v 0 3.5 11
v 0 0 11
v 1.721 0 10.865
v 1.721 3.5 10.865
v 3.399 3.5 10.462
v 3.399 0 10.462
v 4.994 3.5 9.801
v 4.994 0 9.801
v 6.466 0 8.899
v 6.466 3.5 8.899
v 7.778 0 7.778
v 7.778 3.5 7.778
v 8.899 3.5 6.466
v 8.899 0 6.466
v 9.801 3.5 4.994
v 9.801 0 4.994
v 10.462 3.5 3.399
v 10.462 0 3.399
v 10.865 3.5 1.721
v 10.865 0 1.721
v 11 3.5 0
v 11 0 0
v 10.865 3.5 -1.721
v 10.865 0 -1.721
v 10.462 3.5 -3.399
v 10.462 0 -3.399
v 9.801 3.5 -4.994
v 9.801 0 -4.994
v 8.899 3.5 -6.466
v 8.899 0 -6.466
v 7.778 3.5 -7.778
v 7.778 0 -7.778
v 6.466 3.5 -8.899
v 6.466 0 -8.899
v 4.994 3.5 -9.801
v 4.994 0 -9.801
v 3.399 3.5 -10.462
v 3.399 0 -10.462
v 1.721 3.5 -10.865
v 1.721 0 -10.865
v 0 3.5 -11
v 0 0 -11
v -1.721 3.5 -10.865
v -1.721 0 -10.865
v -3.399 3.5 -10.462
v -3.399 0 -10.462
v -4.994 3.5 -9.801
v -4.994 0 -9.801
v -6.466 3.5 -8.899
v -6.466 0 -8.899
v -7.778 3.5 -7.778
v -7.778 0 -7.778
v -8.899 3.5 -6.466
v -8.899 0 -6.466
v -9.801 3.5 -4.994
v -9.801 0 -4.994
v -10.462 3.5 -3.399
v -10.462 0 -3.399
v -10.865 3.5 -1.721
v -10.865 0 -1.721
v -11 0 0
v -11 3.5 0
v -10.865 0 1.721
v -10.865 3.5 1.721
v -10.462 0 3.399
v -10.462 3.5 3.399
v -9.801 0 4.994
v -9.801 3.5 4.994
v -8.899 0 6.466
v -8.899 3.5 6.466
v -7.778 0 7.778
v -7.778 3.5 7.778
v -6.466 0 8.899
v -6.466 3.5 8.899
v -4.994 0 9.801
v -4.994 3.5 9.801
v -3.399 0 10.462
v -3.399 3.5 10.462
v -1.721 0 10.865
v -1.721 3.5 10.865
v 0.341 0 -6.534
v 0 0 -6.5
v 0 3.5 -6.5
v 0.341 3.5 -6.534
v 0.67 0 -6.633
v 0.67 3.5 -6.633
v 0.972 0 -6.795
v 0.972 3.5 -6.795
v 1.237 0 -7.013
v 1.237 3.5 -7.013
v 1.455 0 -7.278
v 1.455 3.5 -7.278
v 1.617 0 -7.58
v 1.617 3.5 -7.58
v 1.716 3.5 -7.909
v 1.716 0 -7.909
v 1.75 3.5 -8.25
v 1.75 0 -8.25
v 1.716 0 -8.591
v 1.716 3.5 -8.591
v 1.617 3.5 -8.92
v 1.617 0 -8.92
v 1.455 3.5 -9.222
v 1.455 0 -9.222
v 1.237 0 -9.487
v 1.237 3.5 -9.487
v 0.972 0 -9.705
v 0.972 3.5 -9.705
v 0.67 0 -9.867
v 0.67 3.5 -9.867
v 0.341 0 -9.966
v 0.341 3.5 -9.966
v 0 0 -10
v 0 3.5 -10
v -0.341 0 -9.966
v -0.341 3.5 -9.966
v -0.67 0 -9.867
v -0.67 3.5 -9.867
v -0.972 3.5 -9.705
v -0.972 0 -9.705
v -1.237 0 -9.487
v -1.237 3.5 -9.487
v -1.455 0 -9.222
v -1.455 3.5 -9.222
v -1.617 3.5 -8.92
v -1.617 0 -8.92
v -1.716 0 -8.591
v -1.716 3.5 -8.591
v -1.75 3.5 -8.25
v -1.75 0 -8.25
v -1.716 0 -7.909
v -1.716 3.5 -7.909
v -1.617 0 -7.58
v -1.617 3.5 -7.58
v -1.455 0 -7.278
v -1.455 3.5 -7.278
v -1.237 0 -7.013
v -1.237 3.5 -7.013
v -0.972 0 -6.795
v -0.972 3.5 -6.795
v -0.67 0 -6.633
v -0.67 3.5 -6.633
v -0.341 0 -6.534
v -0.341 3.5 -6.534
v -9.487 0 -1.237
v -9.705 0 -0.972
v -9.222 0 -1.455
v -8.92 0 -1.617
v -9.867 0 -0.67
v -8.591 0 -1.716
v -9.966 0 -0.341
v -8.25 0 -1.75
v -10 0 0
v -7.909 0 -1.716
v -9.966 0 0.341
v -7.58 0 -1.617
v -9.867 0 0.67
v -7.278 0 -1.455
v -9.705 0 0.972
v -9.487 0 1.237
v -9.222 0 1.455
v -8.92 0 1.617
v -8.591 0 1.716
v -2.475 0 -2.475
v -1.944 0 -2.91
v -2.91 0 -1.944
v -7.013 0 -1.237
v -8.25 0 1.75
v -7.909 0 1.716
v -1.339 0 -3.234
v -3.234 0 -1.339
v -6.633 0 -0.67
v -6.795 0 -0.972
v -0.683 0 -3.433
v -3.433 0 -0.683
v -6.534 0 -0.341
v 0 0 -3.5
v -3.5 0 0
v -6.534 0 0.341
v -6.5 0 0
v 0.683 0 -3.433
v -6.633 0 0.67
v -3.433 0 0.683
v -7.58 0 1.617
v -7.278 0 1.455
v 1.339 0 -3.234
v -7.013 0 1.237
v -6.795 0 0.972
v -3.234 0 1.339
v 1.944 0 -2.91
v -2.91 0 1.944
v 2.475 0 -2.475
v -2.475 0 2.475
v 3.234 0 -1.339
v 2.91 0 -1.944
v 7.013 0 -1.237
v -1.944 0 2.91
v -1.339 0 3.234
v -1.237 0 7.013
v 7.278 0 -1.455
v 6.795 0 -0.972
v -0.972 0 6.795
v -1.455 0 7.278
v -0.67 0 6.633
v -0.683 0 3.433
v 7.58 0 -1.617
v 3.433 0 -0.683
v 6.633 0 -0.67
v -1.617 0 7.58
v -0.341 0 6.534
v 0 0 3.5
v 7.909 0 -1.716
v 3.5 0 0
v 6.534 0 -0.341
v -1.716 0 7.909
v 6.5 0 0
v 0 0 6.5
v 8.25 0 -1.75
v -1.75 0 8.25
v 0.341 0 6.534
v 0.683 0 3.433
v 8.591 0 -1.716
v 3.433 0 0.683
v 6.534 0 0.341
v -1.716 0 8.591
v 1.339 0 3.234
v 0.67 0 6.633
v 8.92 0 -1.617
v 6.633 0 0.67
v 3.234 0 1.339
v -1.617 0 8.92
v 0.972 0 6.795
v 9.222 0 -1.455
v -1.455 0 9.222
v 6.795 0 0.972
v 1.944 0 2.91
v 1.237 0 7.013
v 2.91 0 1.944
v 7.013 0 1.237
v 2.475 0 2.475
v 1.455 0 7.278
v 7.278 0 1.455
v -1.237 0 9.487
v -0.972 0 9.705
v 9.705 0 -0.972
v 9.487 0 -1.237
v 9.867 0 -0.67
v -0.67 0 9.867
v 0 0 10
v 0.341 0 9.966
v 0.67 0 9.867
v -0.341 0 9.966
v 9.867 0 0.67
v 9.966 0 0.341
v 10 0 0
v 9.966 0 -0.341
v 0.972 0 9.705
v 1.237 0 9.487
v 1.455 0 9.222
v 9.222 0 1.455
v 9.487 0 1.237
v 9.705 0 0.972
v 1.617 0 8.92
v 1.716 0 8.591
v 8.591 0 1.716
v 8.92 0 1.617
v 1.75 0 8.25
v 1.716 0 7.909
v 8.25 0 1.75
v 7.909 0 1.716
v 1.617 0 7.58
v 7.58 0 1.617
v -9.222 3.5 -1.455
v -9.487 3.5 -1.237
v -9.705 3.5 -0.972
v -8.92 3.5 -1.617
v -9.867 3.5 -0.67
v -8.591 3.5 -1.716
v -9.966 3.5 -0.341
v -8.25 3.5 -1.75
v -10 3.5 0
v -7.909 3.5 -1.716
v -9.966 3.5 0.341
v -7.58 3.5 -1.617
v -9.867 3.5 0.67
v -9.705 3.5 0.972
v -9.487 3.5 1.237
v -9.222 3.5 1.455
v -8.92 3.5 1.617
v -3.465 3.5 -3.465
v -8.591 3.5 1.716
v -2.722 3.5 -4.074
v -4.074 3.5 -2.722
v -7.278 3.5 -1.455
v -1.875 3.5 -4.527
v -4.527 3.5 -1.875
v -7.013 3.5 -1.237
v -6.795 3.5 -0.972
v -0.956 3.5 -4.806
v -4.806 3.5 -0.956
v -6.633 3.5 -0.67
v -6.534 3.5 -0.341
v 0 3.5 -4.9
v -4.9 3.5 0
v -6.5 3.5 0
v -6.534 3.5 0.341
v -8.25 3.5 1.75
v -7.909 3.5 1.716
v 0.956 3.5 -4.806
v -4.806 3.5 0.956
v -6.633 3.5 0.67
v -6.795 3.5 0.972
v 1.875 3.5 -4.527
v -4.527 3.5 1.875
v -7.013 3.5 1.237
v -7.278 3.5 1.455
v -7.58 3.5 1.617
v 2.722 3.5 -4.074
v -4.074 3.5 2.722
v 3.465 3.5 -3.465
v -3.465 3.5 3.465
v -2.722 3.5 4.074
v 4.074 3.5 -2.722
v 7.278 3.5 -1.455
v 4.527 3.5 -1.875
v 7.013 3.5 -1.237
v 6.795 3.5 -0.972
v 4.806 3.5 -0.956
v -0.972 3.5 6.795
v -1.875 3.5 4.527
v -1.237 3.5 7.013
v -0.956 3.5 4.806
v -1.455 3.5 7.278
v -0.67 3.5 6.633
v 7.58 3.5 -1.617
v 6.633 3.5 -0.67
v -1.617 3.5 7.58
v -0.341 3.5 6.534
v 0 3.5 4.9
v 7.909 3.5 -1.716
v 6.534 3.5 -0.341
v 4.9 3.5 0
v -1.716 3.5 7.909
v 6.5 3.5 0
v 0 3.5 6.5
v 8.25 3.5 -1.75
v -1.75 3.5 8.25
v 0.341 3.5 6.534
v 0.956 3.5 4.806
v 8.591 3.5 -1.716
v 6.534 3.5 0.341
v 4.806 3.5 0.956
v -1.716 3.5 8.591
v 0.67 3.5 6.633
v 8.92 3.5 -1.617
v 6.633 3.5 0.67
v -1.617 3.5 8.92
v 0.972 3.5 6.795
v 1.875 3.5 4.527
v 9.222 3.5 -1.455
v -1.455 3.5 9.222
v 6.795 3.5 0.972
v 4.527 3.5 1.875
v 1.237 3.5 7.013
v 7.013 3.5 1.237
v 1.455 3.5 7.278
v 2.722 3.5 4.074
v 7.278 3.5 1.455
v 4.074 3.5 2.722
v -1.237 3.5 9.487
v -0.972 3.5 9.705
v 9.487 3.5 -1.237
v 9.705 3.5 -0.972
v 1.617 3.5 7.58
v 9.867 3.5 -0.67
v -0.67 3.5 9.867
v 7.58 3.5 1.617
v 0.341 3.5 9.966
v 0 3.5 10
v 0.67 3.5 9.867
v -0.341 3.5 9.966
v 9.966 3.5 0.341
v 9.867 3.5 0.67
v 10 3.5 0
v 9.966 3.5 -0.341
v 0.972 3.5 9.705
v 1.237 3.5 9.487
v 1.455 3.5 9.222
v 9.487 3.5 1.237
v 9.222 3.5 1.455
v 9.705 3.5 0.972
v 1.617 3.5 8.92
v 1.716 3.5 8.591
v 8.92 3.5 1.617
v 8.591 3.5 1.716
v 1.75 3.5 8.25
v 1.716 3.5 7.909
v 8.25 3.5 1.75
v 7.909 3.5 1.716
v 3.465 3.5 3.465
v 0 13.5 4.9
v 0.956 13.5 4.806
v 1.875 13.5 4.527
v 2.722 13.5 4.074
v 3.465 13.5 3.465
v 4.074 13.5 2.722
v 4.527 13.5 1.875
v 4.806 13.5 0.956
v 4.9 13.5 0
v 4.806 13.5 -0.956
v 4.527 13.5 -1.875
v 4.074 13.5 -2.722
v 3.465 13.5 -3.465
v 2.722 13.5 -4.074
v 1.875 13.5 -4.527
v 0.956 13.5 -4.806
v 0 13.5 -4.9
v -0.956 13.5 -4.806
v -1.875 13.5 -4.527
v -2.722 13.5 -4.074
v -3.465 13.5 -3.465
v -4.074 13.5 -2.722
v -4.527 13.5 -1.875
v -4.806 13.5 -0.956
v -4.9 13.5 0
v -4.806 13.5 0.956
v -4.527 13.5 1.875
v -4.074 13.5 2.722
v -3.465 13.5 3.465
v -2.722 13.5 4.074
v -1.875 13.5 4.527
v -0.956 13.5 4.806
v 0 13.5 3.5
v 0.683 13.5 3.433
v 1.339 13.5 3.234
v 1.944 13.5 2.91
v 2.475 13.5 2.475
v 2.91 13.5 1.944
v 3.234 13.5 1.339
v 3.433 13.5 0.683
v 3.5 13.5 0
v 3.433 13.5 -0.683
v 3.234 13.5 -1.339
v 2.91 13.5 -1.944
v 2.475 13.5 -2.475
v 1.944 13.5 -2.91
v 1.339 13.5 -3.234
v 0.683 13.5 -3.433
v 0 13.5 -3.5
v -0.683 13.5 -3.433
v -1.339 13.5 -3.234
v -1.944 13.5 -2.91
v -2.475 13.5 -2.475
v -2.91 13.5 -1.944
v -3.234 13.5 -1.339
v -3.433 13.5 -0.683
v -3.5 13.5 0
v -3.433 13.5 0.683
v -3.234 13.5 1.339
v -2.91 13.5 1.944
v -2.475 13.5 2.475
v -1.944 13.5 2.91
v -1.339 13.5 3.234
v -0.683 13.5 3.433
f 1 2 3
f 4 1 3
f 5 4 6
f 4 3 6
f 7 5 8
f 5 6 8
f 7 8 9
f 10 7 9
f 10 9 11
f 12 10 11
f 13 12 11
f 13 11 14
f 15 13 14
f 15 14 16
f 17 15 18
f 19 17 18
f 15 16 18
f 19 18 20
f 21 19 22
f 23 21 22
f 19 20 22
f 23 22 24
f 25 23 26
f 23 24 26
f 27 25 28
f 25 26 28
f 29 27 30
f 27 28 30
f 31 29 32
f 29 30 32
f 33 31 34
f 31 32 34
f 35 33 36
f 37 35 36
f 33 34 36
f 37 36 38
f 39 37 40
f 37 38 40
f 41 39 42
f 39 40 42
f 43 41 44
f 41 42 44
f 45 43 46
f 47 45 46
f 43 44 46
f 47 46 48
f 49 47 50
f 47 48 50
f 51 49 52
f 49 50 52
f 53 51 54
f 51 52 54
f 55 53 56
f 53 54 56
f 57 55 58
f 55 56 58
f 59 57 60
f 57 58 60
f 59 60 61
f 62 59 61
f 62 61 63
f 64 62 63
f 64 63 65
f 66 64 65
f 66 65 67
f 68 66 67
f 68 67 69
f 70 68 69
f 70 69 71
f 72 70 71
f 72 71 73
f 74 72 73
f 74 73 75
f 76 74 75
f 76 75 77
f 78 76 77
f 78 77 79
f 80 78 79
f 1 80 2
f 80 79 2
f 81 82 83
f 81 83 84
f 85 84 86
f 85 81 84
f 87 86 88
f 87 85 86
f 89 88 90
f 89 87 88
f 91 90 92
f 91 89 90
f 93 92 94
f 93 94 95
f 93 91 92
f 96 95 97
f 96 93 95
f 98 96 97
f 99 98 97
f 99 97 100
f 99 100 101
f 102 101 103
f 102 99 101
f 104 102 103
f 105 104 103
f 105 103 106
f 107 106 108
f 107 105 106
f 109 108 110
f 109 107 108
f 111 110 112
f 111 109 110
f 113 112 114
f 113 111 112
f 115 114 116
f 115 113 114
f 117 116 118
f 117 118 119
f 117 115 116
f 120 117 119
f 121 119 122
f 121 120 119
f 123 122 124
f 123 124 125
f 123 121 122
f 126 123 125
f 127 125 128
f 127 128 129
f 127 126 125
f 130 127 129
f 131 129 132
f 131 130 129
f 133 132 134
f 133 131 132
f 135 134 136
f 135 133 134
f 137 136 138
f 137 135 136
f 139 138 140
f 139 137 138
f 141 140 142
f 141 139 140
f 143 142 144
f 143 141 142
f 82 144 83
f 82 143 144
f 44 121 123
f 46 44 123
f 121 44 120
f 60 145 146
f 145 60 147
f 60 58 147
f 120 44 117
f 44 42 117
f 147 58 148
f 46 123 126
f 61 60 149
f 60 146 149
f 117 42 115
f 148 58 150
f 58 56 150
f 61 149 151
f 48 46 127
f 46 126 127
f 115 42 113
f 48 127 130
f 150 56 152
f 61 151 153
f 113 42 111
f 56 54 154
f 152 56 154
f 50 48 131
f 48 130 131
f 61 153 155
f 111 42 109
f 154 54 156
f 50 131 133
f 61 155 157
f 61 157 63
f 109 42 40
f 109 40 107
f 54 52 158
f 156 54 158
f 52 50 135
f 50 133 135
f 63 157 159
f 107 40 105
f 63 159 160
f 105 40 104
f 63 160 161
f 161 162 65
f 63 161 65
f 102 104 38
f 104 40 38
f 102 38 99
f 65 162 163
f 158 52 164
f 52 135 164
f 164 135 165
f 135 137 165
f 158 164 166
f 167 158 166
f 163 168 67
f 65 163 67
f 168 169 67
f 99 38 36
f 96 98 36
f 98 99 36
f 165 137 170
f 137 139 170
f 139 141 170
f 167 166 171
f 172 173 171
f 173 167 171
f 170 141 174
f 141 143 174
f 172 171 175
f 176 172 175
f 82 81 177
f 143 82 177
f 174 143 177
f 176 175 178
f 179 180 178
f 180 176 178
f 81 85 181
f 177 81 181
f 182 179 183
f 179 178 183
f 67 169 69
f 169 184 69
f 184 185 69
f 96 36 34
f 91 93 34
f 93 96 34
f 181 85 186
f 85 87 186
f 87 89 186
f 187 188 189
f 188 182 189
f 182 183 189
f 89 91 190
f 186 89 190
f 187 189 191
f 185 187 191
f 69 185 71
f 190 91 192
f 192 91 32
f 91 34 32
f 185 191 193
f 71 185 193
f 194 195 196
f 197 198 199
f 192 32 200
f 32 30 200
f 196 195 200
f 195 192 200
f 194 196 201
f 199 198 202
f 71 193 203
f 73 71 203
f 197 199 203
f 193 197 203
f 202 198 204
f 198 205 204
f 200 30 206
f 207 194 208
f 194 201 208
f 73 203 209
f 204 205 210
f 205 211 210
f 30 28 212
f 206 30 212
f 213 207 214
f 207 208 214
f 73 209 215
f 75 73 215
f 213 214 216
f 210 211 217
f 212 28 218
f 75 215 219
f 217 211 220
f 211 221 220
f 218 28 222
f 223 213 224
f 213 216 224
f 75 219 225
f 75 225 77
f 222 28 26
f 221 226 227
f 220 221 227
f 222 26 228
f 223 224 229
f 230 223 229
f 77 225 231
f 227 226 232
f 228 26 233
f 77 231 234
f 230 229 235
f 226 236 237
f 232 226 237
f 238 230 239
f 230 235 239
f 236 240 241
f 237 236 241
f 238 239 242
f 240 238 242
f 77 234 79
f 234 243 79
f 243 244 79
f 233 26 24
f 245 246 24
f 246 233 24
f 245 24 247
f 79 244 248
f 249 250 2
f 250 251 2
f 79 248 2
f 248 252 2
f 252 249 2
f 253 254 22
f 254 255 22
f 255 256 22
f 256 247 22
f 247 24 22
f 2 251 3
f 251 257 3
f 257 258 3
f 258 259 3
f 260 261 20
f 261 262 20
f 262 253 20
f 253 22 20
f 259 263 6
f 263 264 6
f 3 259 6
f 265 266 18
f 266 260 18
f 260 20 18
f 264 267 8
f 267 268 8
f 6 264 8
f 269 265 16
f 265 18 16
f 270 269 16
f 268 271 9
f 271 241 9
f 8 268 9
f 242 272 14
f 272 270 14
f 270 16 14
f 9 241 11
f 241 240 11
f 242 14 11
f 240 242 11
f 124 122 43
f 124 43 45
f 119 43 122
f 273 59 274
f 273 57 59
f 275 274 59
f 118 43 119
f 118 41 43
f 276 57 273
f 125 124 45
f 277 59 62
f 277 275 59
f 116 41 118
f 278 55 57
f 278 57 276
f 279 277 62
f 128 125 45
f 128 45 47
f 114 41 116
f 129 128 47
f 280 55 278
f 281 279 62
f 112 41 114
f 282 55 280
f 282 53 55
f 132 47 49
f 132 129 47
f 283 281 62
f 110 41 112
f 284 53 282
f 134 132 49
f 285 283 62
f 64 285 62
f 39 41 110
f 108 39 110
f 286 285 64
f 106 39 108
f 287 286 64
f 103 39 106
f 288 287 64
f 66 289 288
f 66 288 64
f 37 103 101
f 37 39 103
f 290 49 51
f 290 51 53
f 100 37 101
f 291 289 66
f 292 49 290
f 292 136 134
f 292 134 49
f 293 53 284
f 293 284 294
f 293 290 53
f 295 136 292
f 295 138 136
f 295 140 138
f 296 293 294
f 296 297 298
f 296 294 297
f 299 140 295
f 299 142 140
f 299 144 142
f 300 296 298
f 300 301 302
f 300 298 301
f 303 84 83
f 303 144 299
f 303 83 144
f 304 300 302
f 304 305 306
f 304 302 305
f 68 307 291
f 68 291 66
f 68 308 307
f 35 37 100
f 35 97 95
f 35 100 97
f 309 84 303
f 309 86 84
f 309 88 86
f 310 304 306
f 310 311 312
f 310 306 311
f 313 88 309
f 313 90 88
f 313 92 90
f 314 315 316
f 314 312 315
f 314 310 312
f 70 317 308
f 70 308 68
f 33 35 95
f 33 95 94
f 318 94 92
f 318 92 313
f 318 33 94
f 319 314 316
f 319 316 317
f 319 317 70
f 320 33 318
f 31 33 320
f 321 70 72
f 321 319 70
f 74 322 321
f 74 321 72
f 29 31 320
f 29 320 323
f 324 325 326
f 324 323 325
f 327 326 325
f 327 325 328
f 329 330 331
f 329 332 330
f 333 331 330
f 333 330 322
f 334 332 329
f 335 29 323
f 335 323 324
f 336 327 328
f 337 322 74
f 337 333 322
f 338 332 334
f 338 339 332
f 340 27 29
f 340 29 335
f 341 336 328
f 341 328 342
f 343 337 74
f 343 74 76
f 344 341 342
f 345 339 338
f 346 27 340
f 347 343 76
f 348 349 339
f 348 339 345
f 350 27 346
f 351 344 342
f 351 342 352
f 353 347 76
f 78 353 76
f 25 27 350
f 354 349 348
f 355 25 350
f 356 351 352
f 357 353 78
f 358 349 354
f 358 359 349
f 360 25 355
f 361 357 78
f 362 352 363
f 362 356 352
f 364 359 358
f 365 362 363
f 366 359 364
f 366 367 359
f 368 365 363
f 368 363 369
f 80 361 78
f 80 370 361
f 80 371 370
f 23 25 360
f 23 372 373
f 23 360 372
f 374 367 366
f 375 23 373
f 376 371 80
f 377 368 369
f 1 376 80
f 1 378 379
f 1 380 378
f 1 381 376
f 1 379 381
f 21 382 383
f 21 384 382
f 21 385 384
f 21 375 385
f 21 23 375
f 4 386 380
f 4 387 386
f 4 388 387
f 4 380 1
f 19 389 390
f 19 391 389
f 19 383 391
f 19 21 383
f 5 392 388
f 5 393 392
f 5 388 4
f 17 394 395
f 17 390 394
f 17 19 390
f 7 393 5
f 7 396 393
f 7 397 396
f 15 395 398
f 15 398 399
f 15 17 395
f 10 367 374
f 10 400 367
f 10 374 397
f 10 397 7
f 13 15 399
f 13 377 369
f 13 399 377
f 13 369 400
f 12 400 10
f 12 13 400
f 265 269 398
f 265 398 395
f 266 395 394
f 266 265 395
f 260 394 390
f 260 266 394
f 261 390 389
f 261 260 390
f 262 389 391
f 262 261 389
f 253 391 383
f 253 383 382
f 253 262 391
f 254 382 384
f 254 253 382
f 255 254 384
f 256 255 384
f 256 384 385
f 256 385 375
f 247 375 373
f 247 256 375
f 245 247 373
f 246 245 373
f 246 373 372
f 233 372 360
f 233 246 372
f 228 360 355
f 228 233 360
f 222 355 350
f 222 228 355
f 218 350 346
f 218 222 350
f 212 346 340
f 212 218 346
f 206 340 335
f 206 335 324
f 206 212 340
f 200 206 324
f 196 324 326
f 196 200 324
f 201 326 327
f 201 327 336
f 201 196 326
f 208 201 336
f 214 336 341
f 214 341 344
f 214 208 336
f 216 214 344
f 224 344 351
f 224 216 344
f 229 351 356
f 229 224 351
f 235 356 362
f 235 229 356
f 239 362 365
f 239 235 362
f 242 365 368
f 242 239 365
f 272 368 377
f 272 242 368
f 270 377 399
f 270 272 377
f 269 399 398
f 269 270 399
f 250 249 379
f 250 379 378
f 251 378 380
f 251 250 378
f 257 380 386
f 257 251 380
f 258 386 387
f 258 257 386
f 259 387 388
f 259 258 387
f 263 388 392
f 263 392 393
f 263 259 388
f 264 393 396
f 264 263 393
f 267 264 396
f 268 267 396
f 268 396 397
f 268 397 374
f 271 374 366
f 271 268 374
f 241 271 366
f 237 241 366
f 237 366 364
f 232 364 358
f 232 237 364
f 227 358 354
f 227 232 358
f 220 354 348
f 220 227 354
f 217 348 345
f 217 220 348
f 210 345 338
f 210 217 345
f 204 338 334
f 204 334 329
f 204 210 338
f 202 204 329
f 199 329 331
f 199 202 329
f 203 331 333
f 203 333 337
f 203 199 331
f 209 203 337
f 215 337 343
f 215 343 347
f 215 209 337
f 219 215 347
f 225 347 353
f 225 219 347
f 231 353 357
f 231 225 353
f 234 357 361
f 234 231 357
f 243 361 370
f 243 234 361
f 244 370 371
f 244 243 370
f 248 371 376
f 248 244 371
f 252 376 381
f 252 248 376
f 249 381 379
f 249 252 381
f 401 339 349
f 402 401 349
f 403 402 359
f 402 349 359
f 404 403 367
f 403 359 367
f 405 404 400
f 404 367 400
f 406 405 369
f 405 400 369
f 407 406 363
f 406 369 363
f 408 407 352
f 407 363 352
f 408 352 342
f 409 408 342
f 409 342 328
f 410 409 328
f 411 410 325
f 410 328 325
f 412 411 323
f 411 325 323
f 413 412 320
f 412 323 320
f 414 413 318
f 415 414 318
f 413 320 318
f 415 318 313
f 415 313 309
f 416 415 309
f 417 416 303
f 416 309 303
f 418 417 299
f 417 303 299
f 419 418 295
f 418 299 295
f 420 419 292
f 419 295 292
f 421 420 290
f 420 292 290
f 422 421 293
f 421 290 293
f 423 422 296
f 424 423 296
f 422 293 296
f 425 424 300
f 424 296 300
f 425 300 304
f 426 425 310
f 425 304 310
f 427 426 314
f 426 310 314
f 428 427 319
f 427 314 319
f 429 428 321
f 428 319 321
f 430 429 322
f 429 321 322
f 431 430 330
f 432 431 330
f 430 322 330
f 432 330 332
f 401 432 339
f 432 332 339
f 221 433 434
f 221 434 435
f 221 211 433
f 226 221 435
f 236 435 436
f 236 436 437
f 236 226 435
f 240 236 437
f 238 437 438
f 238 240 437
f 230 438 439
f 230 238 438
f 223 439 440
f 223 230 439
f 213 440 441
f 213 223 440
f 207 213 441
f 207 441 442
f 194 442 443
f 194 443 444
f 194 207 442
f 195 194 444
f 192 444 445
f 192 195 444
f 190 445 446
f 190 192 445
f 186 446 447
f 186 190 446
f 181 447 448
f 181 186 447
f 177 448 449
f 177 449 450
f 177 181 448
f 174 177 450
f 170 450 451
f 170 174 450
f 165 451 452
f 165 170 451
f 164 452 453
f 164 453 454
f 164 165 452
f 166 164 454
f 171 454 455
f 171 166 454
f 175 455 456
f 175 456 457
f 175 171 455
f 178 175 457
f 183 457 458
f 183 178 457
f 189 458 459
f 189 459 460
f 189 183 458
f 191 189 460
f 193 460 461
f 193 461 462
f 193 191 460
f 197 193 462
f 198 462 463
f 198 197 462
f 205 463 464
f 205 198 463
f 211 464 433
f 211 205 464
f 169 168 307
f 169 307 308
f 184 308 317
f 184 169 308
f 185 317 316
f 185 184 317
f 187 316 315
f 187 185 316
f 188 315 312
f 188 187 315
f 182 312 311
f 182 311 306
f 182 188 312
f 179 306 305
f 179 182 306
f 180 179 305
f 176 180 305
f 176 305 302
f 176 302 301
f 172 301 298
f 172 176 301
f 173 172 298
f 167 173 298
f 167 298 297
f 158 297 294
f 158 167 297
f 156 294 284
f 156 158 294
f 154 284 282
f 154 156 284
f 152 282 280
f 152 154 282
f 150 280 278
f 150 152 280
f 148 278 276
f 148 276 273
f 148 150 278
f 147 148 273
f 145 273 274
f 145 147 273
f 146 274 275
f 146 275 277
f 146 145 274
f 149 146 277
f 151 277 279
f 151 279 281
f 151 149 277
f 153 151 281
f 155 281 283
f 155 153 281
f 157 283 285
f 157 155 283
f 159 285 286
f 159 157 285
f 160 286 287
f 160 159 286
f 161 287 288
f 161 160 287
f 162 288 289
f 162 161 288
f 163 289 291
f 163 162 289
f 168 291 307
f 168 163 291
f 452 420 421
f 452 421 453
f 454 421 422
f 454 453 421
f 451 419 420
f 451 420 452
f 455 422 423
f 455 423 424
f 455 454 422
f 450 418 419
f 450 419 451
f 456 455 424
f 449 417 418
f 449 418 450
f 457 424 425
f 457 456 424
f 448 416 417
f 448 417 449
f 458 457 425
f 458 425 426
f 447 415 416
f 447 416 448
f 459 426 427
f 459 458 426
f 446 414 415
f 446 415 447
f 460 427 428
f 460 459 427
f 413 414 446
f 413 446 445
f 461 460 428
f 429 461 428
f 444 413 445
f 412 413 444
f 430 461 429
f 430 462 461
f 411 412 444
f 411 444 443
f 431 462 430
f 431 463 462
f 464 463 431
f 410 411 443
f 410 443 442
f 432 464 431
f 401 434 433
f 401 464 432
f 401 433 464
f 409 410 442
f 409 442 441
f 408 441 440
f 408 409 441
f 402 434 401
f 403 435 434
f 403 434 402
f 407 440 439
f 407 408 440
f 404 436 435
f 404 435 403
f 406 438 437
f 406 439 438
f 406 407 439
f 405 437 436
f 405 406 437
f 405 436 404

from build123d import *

# Parameters (mm, degrees)
CROQUIS1_R              = 11
CROQUIS1_R_2            = 3.5
CROQUIS1_R_3            = 1.75
SALIENTE_EXTRUIR1_DEPTH = 3.5
CROQUIS2_R              = 4.9
CROQUIS2_R_2            = 3.5
SALIENTE_EXTRUIR2_DEPTH = 10


with BuildPart() as part:
    # Croquis1 → Saliente-Extruir1 (new body)
    with BuildSketch(Plane(origin=(0, 0, 0), x_dir=(1, 0, 0), z_dir=(0, 1, 0))):
        with Locations(Location((0, 0, 0), (0, 0, 270))):
            Circle(CROQUIS1_R)
        with Locations(Location((0, 0, 0), (0, 0, 270))):
            Circle(CROQUIS1_R_2, mode=Mode.SUBTRACT)
        with Locations(Location((8.25, 0, 0), (0, 0, 270))):
            Circle(CROQUIS1_R_3, mode=Mode.SUBTRACT)
        with Locations(Location((0, 8.25, 0), (0, 0, 270))):
            Circle(CROQUIS1_R_3, mode=Mode.SUBTRACT)
        with Locations(Location((-8.25, 0, 0), (0, 0, 270))):
            Circle(CROQUIS1_R_3, mode=Mode.SUBTRACT)
        with Locations(Location((0, -8.25, 0), (0, 0, 270))):
            Circle(CROQUIS1_R_3, mode=Mode.SUBTRACT)
    extrude(amount=SALIENTE_EXTRUIR1_DEPTH)

    # Croquis2 → Saliente-Extruir2 (add)
    with BuildSketch(Plane(origin=(0, 3.5, 0), x_dir=(1, 0, 0), z_dir=(0, 1, 0))):
        with Locations(Location((0, 0, 0), (0, 0, 270))):
            Circle(CROQUIS2_R)
        with Locations(Location((0, 0, 0), (0, 0, 270))):
            Circle(CROQUIS2_R_2, mode=Mode.SUBTRACT)
    extrude(amount=SALIENTE_EXTRUIR2_DEPTH)


solid = part.part
